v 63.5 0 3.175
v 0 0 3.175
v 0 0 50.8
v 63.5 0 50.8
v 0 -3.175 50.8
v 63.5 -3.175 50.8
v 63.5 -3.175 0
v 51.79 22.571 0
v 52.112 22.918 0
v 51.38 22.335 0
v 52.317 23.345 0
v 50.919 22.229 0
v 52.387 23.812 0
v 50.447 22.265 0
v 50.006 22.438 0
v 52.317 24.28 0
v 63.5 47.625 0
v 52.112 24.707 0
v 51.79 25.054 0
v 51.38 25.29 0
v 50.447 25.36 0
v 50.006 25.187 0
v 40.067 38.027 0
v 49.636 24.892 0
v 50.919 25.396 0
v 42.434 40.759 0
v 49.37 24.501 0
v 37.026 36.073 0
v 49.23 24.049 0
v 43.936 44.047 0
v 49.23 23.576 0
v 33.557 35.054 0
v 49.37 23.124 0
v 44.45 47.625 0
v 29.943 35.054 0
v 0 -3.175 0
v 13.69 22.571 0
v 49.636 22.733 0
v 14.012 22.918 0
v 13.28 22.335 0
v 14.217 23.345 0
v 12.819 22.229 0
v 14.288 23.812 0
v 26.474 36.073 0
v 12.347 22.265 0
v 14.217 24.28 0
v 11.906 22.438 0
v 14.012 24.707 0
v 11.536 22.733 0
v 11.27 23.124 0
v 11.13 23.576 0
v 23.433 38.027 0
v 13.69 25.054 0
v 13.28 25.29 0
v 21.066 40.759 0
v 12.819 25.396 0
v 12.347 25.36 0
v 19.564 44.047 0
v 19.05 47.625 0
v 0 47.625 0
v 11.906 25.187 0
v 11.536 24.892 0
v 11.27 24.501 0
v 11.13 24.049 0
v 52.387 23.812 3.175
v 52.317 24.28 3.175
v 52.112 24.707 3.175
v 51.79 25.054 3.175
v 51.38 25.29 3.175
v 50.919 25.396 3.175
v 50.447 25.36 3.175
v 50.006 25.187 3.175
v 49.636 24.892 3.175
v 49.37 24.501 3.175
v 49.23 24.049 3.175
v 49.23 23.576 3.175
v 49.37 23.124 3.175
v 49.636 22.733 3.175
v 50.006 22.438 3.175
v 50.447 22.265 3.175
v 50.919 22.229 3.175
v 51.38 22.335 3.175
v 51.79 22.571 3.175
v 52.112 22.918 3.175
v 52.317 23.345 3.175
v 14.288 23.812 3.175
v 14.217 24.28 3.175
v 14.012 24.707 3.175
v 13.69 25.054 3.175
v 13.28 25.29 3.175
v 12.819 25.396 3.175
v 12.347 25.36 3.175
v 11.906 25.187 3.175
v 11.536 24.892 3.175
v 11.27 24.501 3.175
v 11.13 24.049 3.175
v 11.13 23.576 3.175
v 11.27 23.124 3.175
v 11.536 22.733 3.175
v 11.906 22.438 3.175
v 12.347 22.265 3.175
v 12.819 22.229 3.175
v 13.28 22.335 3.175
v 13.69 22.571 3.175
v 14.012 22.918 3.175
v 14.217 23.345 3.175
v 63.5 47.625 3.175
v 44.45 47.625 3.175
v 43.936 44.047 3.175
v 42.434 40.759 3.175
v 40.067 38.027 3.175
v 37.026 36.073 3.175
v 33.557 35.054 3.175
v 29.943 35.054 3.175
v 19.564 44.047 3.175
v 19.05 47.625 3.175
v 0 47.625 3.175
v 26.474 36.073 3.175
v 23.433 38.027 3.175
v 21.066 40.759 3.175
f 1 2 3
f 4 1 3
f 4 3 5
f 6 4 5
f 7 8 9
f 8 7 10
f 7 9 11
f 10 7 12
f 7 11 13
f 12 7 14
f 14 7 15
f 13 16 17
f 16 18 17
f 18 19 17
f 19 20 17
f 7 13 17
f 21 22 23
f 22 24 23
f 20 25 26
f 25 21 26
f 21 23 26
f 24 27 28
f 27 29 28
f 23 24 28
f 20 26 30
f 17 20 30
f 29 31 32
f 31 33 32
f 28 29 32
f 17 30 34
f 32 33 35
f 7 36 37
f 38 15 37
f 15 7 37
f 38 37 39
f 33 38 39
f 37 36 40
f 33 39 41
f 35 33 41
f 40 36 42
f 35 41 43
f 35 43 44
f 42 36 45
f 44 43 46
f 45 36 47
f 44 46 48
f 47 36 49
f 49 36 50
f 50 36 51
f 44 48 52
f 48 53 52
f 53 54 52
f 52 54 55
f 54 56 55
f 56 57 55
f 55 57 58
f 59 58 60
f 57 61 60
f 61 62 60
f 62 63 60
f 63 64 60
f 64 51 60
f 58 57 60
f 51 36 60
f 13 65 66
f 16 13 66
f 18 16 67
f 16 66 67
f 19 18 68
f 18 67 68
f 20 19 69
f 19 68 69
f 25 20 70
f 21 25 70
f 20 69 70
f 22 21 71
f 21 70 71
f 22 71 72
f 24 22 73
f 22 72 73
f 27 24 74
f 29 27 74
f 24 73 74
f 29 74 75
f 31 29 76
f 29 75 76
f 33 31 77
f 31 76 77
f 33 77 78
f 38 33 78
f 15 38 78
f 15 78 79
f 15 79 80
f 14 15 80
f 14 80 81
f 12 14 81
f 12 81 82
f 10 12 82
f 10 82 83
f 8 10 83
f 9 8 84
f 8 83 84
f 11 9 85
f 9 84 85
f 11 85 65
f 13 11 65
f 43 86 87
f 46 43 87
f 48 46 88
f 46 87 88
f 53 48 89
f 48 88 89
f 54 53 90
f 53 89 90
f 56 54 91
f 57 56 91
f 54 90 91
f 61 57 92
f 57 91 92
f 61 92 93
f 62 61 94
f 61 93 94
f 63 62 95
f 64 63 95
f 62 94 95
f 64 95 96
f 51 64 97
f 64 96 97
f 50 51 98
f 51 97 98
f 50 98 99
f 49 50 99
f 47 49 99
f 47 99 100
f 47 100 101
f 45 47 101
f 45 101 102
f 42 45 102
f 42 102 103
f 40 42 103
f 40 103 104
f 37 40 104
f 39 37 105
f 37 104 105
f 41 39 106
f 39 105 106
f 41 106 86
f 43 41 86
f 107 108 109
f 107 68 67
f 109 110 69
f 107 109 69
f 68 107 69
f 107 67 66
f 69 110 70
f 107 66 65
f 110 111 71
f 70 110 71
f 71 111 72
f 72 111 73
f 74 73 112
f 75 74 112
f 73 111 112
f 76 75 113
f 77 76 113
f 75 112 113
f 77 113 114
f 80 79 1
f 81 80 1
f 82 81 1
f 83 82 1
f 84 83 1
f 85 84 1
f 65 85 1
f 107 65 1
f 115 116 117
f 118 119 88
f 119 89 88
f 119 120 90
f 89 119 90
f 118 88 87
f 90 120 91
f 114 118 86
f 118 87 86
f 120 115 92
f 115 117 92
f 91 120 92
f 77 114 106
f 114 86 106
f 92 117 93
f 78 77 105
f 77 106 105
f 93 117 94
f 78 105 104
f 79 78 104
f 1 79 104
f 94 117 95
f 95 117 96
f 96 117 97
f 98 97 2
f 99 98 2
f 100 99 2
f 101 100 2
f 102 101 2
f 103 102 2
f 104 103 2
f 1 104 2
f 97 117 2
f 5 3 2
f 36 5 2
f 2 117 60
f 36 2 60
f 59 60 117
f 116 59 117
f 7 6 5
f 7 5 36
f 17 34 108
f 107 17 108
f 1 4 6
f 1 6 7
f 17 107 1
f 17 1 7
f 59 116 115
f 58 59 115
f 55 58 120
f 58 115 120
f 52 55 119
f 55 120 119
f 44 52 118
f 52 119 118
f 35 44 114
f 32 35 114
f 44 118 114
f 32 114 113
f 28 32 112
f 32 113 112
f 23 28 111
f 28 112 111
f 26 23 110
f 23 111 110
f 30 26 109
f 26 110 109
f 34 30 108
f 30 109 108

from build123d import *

# Parameters (mm, degrees)
BOSS_EXTRUDE1_DEPTH = 63.5
SKETCH2_R           = 12.7
SKETCH2_R_2         = 1.5875
CUT_EXTRUDE1_DEPTH  = 3.175


with BuildPart() as part:
    # Sketch1 → Boss-Extrude1 (new body)
    with BuildSketch(Plane(origin=(0, 0, 0), x_dir=(0, 0, -1), z_dir=(1, 0, 0))):
        Polygon((-3.175, 0), (-50.8, 0), (-50.8, -3.175), (0, -3.175), (0, 0), (0, 47.625), (-3.175, 47.625), align=None)
    extrude(amount=BOSS_EXTRUDE1_DEPTH)

    # Sketch2 → Cut-Extrude1 (cut)
    with BuildSketch(Plane.XY.offset(3.175)):
        with Locations((31.75, 47.625)):
            Circle(SKETCH2_R)
        with Locations((12.7, 23.8125)):
            Circle(SKETCH2_R_2)
        with Locations((50.8, 23.8125)):
            Circle(SKETCH2_R_2)
    extrude(amount=-CUT_EXTRUDE1_DEPTH, mode=Mode.SUBTRACT)


solid = part.part
